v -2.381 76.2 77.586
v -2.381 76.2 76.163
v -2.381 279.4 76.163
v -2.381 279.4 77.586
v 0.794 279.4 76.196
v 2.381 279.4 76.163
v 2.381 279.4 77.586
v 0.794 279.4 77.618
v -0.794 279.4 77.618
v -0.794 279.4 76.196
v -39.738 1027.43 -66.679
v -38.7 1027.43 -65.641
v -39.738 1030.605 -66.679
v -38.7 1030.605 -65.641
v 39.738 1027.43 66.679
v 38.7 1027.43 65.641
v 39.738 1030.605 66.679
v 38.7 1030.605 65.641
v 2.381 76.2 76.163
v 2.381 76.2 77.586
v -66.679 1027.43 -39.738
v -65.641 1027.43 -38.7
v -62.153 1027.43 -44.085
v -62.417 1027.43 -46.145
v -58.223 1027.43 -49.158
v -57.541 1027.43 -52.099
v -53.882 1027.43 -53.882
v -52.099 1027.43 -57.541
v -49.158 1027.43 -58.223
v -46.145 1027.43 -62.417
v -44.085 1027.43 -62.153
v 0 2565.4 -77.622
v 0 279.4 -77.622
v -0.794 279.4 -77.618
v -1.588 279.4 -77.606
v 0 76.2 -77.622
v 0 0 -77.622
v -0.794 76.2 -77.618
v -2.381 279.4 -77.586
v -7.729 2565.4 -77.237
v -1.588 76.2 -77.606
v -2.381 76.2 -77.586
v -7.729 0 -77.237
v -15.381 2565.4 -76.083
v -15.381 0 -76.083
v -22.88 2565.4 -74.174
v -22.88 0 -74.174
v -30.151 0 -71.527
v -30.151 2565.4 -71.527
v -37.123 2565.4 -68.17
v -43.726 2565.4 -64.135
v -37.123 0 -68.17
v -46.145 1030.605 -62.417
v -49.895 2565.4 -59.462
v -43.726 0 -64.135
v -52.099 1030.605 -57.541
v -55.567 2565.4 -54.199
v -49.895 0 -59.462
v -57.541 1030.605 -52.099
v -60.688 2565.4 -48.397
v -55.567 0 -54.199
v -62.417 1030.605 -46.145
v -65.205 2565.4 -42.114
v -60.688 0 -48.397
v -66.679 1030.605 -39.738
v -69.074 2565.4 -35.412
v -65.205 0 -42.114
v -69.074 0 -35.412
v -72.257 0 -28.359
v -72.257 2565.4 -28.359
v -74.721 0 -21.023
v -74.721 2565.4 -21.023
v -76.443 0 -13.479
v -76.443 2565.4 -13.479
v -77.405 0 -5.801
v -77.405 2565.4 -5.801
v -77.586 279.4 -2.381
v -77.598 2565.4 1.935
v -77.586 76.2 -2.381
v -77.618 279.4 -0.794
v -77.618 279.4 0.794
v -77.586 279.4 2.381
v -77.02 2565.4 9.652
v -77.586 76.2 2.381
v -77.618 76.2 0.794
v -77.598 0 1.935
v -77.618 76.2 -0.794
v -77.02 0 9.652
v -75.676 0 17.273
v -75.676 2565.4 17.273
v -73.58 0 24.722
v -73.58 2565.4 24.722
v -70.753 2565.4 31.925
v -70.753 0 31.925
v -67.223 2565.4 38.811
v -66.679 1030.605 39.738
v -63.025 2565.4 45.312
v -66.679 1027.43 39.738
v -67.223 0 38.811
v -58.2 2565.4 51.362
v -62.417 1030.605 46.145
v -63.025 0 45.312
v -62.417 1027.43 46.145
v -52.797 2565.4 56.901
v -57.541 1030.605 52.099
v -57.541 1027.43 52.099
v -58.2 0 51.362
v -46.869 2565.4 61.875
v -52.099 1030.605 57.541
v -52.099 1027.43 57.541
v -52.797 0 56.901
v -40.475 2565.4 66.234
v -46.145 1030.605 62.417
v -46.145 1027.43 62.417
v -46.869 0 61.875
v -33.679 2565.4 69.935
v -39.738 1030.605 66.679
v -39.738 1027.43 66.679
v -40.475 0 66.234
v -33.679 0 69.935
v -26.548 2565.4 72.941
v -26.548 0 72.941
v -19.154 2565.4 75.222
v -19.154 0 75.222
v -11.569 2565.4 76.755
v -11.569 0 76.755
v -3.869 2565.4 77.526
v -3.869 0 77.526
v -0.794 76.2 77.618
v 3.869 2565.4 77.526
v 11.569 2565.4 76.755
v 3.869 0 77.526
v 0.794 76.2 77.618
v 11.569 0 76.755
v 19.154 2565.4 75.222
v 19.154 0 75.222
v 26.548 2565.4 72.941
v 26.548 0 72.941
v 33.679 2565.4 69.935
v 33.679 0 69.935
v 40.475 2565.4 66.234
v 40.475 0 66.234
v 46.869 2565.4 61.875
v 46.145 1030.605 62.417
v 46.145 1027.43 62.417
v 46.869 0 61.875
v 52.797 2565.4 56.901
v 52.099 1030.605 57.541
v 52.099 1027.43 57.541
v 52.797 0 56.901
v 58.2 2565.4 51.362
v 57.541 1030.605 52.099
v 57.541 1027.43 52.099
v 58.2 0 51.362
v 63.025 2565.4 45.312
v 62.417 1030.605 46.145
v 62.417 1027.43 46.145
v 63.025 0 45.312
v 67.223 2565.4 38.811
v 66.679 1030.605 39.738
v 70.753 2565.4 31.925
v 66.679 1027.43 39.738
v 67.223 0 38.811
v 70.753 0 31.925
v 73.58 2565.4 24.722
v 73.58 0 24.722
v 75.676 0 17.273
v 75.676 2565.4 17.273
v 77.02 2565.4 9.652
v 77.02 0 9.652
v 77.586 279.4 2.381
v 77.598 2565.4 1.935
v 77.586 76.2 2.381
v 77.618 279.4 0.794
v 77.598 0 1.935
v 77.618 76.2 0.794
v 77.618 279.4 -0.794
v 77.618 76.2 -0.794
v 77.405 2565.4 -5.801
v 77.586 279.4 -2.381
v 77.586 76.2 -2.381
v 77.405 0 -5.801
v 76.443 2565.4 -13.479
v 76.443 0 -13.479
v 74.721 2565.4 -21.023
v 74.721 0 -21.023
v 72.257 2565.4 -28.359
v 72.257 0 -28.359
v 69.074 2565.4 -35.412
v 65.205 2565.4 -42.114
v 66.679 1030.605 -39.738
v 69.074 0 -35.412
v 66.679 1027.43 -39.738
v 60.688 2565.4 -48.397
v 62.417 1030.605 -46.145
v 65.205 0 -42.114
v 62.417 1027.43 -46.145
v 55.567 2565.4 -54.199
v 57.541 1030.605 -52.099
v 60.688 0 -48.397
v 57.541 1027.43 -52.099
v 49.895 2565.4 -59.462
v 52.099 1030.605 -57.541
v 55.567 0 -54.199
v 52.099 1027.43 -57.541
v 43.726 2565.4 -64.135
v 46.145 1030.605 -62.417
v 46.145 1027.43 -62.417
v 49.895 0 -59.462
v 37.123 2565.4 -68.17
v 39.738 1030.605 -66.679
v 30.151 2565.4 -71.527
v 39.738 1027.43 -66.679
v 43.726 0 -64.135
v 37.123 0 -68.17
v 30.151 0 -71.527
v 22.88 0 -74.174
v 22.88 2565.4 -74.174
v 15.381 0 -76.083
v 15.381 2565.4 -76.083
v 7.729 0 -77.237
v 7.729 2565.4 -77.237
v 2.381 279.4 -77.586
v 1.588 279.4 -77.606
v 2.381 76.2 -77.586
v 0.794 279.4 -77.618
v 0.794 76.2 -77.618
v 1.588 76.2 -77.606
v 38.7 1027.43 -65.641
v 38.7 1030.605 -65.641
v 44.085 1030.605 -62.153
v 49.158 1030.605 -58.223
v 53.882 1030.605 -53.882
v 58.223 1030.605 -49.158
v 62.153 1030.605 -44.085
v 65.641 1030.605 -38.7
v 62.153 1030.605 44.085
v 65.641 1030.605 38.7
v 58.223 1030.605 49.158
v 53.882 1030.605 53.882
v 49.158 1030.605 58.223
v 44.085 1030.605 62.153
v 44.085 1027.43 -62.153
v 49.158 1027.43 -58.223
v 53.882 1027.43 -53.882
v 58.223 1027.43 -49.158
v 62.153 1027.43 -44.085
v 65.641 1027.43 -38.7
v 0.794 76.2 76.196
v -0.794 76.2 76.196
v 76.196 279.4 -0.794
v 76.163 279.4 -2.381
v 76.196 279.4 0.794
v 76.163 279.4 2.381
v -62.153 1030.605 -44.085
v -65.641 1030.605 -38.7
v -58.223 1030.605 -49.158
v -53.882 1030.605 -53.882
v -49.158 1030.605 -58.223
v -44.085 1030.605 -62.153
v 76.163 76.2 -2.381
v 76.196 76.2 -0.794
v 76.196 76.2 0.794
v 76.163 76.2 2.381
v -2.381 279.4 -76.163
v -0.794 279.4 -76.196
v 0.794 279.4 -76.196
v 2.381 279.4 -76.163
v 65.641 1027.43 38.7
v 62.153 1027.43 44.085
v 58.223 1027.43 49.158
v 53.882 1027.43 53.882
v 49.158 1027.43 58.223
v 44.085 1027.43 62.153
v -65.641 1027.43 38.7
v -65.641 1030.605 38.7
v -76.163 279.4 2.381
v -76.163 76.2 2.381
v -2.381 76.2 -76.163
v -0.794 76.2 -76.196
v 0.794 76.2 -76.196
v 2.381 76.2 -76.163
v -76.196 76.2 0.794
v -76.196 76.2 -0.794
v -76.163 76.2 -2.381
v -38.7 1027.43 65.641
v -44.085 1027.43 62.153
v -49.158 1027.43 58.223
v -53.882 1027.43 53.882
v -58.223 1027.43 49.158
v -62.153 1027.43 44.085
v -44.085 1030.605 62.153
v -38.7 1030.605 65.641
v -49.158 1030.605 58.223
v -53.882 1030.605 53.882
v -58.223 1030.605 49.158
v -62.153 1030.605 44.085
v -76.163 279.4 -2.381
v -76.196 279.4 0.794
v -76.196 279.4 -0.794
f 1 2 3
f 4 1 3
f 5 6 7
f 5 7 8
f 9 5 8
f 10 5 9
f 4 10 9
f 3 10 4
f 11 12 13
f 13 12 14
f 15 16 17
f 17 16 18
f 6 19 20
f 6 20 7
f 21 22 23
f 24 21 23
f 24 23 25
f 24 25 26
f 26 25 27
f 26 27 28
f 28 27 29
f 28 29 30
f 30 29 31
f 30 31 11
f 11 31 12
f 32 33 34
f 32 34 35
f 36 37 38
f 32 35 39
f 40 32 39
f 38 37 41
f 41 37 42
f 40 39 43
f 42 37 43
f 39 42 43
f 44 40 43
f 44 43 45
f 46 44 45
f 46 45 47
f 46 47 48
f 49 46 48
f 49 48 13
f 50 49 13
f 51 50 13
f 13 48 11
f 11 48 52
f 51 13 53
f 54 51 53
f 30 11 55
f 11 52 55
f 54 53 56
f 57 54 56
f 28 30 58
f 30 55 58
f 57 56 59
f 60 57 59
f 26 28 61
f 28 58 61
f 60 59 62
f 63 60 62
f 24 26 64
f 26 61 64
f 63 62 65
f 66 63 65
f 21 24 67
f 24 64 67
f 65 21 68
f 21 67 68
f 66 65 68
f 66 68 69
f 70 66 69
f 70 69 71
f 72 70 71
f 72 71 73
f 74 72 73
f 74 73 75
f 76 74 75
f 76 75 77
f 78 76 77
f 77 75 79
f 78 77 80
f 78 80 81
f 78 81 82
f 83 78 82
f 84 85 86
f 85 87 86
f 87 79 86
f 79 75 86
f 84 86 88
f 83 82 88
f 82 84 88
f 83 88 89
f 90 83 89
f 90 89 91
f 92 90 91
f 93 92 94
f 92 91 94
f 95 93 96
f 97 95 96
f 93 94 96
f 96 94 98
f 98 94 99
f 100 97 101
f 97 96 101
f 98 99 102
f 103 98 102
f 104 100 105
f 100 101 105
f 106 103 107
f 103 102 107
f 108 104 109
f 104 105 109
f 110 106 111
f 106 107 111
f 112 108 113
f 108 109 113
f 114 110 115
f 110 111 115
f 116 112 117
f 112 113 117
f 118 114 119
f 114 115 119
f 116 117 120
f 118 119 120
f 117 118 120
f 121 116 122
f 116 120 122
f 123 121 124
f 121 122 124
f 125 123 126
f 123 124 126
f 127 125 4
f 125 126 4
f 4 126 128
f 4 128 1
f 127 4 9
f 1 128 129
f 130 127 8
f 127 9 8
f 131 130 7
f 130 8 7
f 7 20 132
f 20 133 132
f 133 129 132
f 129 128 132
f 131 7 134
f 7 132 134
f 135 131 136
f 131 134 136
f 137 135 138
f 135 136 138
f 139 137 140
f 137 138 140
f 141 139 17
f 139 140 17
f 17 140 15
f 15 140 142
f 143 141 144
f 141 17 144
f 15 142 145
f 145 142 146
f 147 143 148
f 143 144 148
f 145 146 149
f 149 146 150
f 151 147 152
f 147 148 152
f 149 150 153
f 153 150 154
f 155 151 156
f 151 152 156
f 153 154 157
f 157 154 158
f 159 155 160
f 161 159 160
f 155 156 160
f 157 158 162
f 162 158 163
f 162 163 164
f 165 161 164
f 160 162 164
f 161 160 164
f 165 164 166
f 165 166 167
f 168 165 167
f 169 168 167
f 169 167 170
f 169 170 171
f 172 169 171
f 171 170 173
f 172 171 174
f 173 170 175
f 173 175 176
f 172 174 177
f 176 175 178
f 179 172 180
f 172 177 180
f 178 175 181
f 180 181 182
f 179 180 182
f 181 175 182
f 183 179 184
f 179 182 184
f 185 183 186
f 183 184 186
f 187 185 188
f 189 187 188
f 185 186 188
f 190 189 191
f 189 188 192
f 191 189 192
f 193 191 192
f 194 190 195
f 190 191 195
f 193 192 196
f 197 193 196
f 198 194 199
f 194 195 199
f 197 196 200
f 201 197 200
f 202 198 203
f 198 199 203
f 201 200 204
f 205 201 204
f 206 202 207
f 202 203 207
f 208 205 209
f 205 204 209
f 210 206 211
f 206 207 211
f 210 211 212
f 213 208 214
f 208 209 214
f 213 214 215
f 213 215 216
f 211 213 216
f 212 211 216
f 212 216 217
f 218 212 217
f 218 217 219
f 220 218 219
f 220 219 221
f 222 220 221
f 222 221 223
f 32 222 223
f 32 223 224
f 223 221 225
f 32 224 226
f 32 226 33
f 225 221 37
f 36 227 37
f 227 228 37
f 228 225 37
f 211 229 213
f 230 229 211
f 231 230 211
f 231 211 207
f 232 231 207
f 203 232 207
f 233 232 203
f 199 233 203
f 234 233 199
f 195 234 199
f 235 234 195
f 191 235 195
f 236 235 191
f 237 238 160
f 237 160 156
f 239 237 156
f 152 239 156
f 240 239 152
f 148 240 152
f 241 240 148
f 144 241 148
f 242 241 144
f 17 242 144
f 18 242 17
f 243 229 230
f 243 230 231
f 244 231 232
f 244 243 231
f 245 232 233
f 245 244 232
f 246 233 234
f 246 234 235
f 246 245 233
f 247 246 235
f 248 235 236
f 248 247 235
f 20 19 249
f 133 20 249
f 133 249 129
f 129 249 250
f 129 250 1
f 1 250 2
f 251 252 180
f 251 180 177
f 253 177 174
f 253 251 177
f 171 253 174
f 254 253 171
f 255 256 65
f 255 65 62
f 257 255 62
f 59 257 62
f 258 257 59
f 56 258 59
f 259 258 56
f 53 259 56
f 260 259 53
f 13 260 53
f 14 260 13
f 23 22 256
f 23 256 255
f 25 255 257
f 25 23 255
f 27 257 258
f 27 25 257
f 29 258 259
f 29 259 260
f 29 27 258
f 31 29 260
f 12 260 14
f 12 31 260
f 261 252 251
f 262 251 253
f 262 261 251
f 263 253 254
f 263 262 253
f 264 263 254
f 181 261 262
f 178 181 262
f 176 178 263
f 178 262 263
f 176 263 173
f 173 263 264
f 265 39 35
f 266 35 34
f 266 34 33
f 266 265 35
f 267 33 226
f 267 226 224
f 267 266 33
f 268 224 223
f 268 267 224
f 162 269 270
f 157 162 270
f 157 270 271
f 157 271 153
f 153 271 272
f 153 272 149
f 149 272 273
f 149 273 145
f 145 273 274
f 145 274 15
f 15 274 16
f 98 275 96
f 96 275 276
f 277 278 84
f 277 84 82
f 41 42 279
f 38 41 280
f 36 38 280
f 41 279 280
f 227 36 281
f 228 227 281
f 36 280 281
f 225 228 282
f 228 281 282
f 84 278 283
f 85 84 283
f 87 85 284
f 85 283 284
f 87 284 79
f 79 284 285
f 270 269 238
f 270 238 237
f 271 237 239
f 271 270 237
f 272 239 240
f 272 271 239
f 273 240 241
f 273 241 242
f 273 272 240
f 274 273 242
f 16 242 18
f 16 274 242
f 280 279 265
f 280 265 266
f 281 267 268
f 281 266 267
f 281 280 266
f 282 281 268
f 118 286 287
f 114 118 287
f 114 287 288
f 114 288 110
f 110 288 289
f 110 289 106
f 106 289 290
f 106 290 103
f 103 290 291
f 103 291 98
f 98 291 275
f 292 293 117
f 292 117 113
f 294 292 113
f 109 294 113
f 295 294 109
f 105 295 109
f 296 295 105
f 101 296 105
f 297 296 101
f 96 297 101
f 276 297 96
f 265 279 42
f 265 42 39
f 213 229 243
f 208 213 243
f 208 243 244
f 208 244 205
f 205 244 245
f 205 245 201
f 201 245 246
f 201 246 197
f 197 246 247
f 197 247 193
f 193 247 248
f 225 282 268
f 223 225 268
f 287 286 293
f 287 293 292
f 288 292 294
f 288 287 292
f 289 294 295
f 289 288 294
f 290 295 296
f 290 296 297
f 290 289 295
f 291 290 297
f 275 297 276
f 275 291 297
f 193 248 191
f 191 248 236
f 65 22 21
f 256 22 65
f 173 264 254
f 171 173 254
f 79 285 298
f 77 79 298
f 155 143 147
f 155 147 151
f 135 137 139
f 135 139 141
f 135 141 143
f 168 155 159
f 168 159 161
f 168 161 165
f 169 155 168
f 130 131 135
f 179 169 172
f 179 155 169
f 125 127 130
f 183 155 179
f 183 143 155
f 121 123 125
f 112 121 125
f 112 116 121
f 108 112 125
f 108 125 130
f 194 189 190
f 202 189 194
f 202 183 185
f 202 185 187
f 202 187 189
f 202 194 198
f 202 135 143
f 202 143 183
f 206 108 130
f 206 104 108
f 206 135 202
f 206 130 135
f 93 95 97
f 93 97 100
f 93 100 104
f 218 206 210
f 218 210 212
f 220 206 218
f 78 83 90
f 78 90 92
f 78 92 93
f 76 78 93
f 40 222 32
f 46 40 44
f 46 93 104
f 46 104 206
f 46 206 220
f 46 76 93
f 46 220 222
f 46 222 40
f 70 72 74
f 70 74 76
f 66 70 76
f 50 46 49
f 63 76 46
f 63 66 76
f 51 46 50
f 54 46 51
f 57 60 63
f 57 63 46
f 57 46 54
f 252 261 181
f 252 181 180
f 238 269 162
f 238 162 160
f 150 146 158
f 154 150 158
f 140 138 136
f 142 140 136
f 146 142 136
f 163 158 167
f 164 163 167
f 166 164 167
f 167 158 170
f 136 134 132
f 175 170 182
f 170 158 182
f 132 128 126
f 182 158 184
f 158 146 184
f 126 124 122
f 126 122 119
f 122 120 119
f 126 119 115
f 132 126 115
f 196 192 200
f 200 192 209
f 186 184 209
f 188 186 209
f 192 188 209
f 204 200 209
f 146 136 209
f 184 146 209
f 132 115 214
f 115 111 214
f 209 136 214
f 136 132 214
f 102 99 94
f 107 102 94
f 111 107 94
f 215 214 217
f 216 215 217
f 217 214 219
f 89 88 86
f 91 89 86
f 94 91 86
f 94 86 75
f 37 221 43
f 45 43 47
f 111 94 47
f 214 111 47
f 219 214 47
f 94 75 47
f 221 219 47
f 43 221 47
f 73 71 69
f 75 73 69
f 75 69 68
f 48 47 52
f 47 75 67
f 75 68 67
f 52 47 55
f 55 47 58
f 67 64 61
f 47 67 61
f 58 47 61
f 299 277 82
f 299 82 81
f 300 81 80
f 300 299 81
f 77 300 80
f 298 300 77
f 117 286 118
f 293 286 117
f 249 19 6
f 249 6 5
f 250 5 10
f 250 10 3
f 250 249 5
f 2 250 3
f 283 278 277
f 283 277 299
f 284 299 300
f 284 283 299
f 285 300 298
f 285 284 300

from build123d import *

# Parameters (mm, degrees)
SKETCH1_R           = 77.6224
SKETCH1_R_2         = 76.2
BOSS_EXTRUDE1_DEPTH = 2565.4
SKETCH2_W           = 4.7625
SKETCH2_H           = 203.2
CUT_EXTRUDE1_DEPTH  = 2568.747579877
CIRPATTERN1_COUNT   = 4
SKETCH3_W           = 38.1
SKETCH3_H           = 3.175
CUT_EXTRUDE2_DEPTH  = 2568.747579877
CIRPATTERN2_COUNT   = 4
SKETCH4_R           = 76.2
BOSS_EXTRUDE2_DEPTH = 2565.4


with BuildPart() as part:
    # Sketch1 → Boss-Extrude1 (new body)
    with BuildSketch(Plane(origin=(0, 0, 0), x_dir=(1, 0, 0), z_dir=(0, 1, 0))):
        with Locations(Location((0, 0, 0), (0, 0, 90))):
            Circle(SKETCH1_R)
        with Locations(Location((0, 0, 0), (0, 0, 90))):
            Circle(SKETCH1_R_2, mode=Mode.SUBTRACT)
    extrude(amount=BOSS_EXTRUDE1_DEPTH)

    # Sketch2 → Cut-Extrude1 (cut, through all)
    with BuildSketch(Plane.XY):
        with Locations((0, 177.8)):
            Rectangle(SKETCH2_W, SKETCH2_H)
    cut_extrude1 = extrude(amount=-CUT_EXTRUDE1_DEPTH, mode=Mode.SUBTRACT)

    # CirPattern1: Cut-Extrude1 ×4 about axis
    cirpattern1_axis = Axis((0, 0, 0), (0, 1, 0))
    for i in range(1, CIRPATTERN1_COUNT):
        add(cut_extrude1.rotate(cirpattern1_axis, i * 360 / CIRPATTERN1_COUNT), mode=Mode.SUBTRACT)

    # Sketch3 → Cut-Extrude2 (cut, through all)
    with BuildSketch(Plane(origin=(0, 0, 0), x_dir=(0.7071067811865477, 0, 0.7071067811865475), z_dir=(-0.7071067811865475, 0, 0.7071067811865477))):
        with Locations((0, 1029.0175)):
            Rectangle(SKETCH3_W, SKETCH3_H)
    cut_extrude2 = extrude(amount=-CUT_EXTRUDE2_DEPTH, mode=Mode.SUBTRACT)

    # CirPattern2: Cut-Extrude2 ×4 about axis
    cirpattern2_axis = Axis((0, 0, 0), (0, 1, 0))
    for i in range(1, CIRPATTERN2_COUNT):
        add(cut_extrude2.rotate(cirpattern2_axis, i * 360 / CIRPATTERN2_COUNT), mode=Mode.SUBTRACT)

    # Sketch4 → Boss-Extrude2 (add)
    with BuildSketch(Plane.XZ):
        Circle(SKETCH4_R)
    extrude(amount=-BOSS_EXTRUDE2_DEPTH)


solid = part.part
